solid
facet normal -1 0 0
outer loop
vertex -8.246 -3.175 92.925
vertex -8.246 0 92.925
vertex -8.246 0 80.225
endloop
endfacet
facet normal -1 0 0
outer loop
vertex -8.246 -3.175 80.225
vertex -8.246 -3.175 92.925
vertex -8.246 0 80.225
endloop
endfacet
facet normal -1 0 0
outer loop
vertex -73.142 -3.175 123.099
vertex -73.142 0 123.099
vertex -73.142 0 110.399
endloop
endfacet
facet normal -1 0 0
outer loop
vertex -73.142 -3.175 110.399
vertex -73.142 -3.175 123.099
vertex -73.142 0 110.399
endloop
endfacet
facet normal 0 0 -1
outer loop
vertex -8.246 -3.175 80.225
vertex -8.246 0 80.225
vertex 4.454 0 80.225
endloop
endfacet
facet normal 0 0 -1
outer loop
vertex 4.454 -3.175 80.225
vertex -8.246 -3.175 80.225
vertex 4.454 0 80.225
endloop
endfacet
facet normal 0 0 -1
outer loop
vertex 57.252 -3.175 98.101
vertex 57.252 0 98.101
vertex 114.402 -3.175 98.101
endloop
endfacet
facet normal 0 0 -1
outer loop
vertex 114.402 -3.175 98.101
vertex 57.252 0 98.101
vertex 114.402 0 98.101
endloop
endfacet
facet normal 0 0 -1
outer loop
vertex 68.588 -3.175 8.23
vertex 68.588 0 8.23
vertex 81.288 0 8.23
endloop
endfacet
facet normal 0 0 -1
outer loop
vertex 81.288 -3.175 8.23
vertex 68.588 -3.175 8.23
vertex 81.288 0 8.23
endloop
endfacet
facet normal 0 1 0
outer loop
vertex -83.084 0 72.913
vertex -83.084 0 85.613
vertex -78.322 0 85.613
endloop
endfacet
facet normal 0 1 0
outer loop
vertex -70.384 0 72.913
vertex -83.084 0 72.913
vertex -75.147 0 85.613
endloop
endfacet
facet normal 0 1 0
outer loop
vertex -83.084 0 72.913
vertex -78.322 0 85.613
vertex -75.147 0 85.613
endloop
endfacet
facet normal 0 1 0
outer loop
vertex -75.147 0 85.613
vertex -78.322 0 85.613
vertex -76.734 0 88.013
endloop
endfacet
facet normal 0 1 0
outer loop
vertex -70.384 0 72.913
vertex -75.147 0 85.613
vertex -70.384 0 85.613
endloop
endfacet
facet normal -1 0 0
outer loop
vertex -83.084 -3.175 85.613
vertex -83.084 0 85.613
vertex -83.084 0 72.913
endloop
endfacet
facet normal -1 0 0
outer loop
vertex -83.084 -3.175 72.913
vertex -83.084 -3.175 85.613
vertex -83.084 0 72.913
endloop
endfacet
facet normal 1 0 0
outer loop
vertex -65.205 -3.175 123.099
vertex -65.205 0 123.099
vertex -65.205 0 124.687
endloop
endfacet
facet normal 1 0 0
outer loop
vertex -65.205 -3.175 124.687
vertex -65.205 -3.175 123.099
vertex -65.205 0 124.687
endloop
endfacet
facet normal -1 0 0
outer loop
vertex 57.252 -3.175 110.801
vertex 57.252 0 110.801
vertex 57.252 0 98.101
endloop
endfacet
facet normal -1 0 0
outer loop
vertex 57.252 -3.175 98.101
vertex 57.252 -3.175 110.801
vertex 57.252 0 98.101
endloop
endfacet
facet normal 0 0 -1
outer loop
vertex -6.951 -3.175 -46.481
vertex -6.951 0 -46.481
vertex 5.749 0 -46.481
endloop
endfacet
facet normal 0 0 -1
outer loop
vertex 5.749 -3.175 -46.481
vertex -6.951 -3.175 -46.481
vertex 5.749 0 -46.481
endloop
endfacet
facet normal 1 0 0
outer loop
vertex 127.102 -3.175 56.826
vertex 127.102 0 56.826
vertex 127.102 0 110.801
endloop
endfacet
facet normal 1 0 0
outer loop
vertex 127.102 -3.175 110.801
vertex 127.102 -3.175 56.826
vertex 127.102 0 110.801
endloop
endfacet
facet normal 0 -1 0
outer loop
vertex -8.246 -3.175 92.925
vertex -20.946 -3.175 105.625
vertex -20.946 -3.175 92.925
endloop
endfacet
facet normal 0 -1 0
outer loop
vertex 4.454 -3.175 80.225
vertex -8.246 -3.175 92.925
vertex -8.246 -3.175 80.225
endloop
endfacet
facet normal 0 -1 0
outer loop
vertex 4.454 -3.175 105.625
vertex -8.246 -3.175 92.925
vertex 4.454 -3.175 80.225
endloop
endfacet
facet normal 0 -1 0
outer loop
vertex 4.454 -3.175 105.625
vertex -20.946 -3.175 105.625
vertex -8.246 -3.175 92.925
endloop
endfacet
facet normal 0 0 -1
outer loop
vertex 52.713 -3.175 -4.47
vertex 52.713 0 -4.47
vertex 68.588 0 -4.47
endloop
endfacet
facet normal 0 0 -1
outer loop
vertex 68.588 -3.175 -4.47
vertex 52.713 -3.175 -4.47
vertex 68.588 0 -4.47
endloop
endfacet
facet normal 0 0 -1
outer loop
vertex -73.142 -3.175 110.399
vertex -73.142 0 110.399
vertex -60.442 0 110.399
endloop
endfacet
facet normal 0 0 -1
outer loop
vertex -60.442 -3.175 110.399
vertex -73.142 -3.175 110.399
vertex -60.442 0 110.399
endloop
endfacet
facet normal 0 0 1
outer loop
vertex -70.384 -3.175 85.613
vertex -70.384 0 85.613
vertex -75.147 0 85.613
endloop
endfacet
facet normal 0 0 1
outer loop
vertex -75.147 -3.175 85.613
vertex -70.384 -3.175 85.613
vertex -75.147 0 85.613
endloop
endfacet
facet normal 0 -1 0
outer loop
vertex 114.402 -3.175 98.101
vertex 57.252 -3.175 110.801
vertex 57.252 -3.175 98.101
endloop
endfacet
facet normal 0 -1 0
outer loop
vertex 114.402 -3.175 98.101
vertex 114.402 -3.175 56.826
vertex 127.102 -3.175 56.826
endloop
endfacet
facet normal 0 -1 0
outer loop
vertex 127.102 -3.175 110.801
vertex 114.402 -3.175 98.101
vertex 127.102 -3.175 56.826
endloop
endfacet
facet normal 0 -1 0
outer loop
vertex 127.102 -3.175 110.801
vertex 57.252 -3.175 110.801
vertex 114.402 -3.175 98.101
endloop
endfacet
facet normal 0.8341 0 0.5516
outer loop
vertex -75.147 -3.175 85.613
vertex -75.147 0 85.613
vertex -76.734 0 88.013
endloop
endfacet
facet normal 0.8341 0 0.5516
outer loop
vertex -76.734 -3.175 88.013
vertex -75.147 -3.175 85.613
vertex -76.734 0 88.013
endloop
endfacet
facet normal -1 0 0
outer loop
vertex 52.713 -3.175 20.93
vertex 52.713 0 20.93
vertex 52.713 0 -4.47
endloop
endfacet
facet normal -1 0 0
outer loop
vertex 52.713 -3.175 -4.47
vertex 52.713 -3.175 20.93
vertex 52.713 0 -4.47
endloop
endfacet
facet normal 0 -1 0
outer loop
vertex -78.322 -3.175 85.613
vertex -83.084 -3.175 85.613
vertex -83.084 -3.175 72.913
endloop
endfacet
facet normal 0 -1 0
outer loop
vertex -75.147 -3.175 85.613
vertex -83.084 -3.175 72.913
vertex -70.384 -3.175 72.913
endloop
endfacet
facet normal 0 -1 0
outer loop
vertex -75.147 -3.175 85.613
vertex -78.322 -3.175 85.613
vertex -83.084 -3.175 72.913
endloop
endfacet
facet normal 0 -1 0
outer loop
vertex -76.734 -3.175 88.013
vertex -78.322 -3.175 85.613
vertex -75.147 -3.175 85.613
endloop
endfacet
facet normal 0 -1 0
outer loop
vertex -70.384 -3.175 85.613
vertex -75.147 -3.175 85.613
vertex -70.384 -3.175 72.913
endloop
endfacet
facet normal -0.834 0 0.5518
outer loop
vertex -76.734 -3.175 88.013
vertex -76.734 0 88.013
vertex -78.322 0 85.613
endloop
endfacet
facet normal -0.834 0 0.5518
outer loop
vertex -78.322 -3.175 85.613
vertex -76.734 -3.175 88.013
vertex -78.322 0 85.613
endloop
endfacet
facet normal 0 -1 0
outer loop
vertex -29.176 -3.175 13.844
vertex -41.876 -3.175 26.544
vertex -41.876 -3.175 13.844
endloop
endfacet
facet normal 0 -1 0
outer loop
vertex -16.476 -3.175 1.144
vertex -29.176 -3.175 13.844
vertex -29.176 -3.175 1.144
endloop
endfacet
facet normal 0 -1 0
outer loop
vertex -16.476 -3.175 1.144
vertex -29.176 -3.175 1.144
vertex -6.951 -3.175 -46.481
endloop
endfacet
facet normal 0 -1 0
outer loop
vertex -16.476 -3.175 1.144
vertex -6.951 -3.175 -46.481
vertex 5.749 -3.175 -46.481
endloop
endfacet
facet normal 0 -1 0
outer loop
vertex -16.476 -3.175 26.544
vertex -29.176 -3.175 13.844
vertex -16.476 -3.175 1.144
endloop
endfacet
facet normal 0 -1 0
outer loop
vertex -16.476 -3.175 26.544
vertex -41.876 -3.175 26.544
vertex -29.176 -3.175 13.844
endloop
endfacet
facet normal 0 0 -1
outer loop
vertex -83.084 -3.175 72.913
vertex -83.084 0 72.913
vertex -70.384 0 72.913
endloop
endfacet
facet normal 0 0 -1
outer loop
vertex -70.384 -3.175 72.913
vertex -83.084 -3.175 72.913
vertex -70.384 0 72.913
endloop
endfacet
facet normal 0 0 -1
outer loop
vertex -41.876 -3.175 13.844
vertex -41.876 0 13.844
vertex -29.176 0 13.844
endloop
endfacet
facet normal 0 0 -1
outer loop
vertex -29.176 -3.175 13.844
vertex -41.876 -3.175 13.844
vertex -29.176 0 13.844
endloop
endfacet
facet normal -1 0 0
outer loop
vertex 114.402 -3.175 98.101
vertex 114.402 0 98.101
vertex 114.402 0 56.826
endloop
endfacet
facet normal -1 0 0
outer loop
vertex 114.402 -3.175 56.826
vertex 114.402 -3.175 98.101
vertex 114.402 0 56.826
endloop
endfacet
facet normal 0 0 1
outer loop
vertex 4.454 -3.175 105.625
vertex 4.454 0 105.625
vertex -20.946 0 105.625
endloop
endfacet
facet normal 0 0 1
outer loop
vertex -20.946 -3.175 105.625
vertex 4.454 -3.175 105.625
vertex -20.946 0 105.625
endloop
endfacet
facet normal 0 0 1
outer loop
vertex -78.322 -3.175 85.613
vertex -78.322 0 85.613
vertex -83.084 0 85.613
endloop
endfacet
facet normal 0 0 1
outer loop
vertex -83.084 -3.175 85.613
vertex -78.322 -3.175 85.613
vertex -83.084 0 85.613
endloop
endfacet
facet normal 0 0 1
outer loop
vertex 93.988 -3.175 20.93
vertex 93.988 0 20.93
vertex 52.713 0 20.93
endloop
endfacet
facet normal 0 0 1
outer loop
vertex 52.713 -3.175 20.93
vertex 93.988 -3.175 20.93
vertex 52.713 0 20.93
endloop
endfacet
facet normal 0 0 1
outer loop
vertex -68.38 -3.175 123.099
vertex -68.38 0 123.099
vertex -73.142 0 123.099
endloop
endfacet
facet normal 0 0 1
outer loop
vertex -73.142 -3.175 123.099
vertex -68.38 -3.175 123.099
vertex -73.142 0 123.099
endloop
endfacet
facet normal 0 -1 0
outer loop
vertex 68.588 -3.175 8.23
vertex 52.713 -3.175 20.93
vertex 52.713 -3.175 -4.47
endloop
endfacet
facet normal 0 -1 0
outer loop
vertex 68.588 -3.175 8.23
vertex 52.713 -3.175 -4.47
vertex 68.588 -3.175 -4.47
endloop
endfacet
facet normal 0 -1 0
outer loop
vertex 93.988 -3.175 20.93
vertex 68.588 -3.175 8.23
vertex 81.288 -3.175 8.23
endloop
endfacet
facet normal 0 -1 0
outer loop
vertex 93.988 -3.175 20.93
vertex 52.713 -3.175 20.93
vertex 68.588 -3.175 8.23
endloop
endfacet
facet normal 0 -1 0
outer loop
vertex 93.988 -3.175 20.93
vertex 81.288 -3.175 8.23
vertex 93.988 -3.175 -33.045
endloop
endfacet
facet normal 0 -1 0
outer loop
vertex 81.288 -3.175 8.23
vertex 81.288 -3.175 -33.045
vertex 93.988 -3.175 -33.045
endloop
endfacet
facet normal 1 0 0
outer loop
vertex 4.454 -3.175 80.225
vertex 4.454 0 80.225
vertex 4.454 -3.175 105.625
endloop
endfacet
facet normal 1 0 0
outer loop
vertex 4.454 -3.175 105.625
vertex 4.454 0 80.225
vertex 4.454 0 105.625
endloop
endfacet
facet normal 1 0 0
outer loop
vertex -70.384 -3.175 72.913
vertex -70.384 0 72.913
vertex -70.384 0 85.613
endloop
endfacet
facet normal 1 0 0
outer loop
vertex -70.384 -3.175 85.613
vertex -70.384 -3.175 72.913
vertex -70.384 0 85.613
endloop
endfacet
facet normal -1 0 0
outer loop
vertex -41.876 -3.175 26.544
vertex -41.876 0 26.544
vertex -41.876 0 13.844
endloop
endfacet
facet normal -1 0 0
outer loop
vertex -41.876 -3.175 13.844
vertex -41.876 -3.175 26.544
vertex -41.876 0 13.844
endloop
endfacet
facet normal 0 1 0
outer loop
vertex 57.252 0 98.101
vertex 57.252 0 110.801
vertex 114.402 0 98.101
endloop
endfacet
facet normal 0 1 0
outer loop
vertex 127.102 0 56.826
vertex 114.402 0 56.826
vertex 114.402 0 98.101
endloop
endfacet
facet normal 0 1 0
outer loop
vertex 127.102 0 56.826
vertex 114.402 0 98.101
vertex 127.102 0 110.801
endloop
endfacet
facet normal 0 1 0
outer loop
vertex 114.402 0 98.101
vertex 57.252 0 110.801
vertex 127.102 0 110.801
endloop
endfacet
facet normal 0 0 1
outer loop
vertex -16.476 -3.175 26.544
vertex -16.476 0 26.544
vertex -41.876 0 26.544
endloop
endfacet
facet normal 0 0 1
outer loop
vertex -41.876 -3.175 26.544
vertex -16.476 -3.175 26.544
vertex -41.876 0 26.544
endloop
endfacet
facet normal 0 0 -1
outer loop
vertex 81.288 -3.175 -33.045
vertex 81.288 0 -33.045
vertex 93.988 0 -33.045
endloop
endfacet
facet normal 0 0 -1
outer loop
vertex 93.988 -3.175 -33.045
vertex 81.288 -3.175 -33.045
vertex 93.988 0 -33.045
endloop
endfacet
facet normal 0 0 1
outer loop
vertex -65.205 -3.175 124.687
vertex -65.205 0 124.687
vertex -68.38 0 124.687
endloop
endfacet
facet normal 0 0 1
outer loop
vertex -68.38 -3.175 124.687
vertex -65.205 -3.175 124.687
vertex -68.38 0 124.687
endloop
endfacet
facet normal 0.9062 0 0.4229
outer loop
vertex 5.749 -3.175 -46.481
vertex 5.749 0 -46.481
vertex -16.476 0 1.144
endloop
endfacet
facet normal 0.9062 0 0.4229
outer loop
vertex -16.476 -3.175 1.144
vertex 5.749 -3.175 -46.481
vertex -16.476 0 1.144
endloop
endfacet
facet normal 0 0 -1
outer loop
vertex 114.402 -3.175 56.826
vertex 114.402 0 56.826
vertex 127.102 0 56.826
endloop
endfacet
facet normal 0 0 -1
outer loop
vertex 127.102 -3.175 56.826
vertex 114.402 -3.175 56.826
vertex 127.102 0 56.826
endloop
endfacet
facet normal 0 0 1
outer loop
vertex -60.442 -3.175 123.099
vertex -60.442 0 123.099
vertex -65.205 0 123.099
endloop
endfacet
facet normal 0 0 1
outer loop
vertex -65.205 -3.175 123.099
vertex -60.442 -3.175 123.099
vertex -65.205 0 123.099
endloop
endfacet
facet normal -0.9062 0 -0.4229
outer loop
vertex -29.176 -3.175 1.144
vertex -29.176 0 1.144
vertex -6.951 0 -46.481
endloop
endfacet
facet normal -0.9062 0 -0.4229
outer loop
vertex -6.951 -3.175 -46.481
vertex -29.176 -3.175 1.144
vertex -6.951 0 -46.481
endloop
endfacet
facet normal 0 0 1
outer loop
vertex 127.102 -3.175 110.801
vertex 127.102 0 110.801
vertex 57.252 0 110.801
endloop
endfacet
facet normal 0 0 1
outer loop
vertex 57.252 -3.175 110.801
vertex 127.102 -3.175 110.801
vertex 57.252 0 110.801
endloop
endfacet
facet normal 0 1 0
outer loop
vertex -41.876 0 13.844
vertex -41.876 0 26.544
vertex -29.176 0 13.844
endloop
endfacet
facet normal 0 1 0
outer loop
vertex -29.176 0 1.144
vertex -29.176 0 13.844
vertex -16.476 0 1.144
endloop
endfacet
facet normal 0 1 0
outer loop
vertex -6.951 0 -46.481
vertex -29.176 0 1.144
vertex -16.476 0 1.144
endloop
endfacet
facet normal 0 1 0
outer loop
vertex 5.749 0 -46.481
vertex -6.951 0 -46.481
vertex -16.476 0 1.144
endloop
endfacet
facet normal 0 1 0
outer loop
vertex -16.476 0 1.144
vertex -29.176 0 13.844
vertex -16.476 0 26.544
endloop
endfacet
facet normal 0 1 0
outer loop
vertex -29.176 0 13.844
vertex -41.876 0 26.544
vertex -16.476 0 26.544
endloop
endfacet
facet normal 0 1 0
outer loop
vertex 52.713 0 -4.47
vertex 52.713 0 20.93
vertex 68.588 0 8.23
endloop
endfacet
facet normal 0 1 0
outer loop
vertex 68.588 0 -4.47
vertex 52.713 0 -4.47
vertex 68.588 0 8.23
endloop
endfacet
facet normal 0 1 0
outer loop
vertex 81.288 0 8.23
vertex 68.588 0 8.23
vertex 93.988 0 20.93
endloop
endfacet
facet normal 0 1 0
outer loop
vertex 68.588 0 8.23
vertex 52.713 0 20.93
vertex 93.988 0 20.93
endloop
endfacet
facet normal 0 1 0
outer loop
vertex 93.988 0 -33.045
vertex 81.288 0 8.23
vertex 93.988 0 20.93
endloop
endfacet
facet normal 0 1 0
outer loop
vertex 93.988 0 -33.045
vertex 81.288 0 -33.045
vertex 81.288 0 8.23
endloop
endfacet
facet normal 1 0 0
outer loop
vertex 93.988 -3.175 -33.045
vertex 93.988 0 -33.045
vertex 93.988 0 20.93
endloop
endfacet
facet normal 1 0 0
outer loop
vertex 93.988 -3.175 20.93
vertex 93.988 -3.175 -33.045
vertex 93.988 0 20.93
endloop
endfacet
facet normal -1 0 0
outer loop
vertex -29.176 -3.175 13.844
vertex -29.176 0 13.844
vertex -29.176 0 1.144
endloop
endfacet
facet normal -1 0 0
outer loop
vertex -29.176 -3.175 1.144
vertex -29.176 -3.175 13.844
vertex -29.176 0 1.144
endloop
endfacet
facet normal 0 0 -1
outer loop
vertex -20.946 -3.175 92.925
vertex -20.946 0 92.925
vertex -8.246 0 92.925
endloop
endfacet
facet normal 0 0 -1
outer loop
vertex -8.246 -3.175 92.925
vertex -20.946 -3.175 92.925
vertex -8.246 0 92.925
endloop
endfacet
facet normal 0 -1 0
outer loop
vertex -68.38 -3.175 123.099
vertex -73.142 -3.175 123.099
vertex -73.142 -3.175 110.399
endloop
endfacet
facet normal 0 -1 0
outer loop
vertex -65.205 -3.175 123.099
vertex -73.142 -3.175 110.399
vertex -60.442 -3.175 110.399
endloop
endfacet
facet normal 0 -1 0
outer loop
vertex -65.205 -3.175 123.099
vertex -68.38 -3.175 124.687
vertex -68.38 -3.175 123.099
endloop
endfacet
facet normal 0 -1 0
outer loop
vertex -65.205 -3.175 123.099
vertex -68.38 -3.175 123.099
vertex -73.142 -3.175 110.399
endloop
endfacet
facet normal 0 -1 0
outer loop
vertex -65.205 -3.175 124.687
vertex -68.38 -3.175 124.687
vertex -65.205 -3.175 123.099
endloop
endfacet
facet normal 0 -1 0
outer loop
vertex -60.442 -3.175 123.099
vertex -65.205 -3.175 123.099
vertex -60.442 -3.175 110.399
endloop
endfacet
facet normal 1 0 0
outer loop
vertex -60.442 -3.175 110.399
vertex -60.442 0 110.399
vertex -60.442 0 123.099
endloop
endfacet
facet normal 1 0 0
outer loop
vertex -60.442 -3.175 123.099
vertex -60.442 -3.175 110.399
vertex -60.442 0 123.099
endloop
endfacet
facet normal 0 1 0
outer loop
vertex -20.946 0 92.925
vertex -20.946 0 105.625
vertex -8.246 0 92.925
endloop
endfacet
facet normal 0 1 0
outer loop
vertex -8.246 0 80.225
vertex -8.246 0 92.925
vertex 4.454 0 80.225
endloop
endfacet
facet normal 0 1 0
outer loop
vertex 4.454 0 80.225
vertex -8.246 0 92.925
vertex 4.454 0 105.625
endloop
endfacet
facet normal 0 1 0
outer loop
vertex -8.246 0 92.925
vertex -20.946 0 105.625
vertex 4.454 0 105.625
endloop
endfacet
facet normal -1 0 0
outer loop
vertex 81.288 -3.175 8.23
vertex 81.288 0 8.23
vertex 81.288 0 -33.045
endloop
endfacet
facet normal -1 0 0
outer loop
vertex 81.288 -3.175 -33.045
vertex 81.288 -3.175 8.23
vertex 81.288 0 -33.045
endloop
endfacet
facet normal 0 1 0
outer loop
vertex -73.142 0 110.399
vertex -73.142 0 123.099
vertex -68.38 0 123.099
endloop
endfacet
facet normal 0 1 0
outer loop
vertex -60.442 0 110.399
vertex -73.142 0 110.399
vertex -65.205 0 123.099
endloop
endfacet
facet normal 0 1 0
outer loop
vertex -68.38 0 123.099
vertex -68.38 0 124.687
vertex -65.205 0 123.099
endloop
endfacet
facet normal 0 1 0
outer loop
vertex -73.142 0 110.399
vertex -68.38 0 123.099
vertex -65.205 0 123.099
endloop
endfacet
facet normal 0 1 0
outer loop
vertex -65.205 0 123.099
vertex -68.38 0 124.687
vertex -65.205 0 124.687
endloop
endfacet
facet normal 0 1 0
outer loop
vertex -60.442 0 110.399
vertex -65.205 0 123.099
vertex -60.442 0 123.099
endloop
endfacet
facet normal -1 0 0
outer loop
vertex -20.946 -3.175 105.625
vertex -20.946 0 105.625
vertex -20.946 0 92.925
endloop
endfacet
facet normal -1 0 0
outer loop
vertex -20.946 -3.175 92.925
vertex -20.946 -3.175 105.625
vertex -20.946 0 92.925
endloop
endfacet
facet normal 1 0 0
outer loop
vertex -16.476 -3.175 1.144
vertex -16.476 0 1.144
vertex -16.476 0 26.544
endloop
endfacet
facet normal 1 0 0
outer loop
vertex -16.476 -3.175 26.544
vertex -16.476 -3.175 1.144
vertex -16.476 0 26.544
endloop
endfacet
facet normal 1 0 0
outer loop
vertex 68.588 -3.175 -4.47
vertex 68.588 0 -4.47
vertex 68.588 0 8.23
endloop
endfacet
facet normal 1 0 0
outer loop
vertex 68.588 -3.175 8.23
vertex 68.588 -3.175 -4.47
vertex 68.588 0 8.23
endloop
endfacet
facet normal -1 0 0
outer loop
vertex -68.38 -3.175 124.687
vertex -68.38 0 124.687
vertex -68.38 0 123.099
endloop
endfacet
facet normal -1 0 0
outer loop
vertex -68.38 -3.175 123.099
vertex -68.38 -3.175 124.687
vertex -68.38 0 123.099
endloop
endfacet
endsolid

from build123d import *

# Parameters (mm, degrees)
F1_DEPTH = 3.175


with BuildPart() as f1:
    # F0 (on Front) → F1 (new body)
    with BuildSketch(Plane.XZ):
        Polygon((-16.475739, 26.54437), (-41.875739, 26.54437), (-41.875739, 13.84437), (-29.175739, 13.84437), (-29.175739, 1.14437), (-6.950739, -46.48063), (5.749261, -46.48063), (-16.475739, 1.14437), align=None)
        Polygon((4.454088, 105.624579), (-20.945912, 105.624579), (-20.945912, 92.924579), (-8.245912, 92.924579), (-8.245912, 80.224579), (4.454088, 80.224579), align=None)
        Polygon((81.288335, 8.23004), (81.288335, -33.04496), (93.988335, -33.04496), (93.988335, 20.93004), (52.713335, 20.93004), (52.713335, -4.46996), (68.588335, -4.46996), (68.588335, 8.23004), align=None)
        Polygon((127.102269, 110.801199), (57.252269, 110.801199), (57.252269, 98.101199), (114.402269, 98.101199), (114.402269, 56.826199), (127.102269, 56.826199), align=None)
        Polygon((-68.379502, 123.099409), (-73.142002, 123.099409), (-73.142002, 110.399409), (-60.442002, 110.399409), (-60.442002, 123.099409), (-65.204502, 123.099409), (-65.204502, 124.686909), (-68.379502, 124.686909), align=None)
        Polygon((-78.321708, 85.612997), (-83.084208, 85.612997), (-83.084208, 72.912997), (-70.384208, 72.912997), (-70.384208, 85.612997), (-75.146708, 85.612997), (-76.734208, 88.013297), align=None)
    extrude(amount=F1_DEPTH)


solid = f1.part
